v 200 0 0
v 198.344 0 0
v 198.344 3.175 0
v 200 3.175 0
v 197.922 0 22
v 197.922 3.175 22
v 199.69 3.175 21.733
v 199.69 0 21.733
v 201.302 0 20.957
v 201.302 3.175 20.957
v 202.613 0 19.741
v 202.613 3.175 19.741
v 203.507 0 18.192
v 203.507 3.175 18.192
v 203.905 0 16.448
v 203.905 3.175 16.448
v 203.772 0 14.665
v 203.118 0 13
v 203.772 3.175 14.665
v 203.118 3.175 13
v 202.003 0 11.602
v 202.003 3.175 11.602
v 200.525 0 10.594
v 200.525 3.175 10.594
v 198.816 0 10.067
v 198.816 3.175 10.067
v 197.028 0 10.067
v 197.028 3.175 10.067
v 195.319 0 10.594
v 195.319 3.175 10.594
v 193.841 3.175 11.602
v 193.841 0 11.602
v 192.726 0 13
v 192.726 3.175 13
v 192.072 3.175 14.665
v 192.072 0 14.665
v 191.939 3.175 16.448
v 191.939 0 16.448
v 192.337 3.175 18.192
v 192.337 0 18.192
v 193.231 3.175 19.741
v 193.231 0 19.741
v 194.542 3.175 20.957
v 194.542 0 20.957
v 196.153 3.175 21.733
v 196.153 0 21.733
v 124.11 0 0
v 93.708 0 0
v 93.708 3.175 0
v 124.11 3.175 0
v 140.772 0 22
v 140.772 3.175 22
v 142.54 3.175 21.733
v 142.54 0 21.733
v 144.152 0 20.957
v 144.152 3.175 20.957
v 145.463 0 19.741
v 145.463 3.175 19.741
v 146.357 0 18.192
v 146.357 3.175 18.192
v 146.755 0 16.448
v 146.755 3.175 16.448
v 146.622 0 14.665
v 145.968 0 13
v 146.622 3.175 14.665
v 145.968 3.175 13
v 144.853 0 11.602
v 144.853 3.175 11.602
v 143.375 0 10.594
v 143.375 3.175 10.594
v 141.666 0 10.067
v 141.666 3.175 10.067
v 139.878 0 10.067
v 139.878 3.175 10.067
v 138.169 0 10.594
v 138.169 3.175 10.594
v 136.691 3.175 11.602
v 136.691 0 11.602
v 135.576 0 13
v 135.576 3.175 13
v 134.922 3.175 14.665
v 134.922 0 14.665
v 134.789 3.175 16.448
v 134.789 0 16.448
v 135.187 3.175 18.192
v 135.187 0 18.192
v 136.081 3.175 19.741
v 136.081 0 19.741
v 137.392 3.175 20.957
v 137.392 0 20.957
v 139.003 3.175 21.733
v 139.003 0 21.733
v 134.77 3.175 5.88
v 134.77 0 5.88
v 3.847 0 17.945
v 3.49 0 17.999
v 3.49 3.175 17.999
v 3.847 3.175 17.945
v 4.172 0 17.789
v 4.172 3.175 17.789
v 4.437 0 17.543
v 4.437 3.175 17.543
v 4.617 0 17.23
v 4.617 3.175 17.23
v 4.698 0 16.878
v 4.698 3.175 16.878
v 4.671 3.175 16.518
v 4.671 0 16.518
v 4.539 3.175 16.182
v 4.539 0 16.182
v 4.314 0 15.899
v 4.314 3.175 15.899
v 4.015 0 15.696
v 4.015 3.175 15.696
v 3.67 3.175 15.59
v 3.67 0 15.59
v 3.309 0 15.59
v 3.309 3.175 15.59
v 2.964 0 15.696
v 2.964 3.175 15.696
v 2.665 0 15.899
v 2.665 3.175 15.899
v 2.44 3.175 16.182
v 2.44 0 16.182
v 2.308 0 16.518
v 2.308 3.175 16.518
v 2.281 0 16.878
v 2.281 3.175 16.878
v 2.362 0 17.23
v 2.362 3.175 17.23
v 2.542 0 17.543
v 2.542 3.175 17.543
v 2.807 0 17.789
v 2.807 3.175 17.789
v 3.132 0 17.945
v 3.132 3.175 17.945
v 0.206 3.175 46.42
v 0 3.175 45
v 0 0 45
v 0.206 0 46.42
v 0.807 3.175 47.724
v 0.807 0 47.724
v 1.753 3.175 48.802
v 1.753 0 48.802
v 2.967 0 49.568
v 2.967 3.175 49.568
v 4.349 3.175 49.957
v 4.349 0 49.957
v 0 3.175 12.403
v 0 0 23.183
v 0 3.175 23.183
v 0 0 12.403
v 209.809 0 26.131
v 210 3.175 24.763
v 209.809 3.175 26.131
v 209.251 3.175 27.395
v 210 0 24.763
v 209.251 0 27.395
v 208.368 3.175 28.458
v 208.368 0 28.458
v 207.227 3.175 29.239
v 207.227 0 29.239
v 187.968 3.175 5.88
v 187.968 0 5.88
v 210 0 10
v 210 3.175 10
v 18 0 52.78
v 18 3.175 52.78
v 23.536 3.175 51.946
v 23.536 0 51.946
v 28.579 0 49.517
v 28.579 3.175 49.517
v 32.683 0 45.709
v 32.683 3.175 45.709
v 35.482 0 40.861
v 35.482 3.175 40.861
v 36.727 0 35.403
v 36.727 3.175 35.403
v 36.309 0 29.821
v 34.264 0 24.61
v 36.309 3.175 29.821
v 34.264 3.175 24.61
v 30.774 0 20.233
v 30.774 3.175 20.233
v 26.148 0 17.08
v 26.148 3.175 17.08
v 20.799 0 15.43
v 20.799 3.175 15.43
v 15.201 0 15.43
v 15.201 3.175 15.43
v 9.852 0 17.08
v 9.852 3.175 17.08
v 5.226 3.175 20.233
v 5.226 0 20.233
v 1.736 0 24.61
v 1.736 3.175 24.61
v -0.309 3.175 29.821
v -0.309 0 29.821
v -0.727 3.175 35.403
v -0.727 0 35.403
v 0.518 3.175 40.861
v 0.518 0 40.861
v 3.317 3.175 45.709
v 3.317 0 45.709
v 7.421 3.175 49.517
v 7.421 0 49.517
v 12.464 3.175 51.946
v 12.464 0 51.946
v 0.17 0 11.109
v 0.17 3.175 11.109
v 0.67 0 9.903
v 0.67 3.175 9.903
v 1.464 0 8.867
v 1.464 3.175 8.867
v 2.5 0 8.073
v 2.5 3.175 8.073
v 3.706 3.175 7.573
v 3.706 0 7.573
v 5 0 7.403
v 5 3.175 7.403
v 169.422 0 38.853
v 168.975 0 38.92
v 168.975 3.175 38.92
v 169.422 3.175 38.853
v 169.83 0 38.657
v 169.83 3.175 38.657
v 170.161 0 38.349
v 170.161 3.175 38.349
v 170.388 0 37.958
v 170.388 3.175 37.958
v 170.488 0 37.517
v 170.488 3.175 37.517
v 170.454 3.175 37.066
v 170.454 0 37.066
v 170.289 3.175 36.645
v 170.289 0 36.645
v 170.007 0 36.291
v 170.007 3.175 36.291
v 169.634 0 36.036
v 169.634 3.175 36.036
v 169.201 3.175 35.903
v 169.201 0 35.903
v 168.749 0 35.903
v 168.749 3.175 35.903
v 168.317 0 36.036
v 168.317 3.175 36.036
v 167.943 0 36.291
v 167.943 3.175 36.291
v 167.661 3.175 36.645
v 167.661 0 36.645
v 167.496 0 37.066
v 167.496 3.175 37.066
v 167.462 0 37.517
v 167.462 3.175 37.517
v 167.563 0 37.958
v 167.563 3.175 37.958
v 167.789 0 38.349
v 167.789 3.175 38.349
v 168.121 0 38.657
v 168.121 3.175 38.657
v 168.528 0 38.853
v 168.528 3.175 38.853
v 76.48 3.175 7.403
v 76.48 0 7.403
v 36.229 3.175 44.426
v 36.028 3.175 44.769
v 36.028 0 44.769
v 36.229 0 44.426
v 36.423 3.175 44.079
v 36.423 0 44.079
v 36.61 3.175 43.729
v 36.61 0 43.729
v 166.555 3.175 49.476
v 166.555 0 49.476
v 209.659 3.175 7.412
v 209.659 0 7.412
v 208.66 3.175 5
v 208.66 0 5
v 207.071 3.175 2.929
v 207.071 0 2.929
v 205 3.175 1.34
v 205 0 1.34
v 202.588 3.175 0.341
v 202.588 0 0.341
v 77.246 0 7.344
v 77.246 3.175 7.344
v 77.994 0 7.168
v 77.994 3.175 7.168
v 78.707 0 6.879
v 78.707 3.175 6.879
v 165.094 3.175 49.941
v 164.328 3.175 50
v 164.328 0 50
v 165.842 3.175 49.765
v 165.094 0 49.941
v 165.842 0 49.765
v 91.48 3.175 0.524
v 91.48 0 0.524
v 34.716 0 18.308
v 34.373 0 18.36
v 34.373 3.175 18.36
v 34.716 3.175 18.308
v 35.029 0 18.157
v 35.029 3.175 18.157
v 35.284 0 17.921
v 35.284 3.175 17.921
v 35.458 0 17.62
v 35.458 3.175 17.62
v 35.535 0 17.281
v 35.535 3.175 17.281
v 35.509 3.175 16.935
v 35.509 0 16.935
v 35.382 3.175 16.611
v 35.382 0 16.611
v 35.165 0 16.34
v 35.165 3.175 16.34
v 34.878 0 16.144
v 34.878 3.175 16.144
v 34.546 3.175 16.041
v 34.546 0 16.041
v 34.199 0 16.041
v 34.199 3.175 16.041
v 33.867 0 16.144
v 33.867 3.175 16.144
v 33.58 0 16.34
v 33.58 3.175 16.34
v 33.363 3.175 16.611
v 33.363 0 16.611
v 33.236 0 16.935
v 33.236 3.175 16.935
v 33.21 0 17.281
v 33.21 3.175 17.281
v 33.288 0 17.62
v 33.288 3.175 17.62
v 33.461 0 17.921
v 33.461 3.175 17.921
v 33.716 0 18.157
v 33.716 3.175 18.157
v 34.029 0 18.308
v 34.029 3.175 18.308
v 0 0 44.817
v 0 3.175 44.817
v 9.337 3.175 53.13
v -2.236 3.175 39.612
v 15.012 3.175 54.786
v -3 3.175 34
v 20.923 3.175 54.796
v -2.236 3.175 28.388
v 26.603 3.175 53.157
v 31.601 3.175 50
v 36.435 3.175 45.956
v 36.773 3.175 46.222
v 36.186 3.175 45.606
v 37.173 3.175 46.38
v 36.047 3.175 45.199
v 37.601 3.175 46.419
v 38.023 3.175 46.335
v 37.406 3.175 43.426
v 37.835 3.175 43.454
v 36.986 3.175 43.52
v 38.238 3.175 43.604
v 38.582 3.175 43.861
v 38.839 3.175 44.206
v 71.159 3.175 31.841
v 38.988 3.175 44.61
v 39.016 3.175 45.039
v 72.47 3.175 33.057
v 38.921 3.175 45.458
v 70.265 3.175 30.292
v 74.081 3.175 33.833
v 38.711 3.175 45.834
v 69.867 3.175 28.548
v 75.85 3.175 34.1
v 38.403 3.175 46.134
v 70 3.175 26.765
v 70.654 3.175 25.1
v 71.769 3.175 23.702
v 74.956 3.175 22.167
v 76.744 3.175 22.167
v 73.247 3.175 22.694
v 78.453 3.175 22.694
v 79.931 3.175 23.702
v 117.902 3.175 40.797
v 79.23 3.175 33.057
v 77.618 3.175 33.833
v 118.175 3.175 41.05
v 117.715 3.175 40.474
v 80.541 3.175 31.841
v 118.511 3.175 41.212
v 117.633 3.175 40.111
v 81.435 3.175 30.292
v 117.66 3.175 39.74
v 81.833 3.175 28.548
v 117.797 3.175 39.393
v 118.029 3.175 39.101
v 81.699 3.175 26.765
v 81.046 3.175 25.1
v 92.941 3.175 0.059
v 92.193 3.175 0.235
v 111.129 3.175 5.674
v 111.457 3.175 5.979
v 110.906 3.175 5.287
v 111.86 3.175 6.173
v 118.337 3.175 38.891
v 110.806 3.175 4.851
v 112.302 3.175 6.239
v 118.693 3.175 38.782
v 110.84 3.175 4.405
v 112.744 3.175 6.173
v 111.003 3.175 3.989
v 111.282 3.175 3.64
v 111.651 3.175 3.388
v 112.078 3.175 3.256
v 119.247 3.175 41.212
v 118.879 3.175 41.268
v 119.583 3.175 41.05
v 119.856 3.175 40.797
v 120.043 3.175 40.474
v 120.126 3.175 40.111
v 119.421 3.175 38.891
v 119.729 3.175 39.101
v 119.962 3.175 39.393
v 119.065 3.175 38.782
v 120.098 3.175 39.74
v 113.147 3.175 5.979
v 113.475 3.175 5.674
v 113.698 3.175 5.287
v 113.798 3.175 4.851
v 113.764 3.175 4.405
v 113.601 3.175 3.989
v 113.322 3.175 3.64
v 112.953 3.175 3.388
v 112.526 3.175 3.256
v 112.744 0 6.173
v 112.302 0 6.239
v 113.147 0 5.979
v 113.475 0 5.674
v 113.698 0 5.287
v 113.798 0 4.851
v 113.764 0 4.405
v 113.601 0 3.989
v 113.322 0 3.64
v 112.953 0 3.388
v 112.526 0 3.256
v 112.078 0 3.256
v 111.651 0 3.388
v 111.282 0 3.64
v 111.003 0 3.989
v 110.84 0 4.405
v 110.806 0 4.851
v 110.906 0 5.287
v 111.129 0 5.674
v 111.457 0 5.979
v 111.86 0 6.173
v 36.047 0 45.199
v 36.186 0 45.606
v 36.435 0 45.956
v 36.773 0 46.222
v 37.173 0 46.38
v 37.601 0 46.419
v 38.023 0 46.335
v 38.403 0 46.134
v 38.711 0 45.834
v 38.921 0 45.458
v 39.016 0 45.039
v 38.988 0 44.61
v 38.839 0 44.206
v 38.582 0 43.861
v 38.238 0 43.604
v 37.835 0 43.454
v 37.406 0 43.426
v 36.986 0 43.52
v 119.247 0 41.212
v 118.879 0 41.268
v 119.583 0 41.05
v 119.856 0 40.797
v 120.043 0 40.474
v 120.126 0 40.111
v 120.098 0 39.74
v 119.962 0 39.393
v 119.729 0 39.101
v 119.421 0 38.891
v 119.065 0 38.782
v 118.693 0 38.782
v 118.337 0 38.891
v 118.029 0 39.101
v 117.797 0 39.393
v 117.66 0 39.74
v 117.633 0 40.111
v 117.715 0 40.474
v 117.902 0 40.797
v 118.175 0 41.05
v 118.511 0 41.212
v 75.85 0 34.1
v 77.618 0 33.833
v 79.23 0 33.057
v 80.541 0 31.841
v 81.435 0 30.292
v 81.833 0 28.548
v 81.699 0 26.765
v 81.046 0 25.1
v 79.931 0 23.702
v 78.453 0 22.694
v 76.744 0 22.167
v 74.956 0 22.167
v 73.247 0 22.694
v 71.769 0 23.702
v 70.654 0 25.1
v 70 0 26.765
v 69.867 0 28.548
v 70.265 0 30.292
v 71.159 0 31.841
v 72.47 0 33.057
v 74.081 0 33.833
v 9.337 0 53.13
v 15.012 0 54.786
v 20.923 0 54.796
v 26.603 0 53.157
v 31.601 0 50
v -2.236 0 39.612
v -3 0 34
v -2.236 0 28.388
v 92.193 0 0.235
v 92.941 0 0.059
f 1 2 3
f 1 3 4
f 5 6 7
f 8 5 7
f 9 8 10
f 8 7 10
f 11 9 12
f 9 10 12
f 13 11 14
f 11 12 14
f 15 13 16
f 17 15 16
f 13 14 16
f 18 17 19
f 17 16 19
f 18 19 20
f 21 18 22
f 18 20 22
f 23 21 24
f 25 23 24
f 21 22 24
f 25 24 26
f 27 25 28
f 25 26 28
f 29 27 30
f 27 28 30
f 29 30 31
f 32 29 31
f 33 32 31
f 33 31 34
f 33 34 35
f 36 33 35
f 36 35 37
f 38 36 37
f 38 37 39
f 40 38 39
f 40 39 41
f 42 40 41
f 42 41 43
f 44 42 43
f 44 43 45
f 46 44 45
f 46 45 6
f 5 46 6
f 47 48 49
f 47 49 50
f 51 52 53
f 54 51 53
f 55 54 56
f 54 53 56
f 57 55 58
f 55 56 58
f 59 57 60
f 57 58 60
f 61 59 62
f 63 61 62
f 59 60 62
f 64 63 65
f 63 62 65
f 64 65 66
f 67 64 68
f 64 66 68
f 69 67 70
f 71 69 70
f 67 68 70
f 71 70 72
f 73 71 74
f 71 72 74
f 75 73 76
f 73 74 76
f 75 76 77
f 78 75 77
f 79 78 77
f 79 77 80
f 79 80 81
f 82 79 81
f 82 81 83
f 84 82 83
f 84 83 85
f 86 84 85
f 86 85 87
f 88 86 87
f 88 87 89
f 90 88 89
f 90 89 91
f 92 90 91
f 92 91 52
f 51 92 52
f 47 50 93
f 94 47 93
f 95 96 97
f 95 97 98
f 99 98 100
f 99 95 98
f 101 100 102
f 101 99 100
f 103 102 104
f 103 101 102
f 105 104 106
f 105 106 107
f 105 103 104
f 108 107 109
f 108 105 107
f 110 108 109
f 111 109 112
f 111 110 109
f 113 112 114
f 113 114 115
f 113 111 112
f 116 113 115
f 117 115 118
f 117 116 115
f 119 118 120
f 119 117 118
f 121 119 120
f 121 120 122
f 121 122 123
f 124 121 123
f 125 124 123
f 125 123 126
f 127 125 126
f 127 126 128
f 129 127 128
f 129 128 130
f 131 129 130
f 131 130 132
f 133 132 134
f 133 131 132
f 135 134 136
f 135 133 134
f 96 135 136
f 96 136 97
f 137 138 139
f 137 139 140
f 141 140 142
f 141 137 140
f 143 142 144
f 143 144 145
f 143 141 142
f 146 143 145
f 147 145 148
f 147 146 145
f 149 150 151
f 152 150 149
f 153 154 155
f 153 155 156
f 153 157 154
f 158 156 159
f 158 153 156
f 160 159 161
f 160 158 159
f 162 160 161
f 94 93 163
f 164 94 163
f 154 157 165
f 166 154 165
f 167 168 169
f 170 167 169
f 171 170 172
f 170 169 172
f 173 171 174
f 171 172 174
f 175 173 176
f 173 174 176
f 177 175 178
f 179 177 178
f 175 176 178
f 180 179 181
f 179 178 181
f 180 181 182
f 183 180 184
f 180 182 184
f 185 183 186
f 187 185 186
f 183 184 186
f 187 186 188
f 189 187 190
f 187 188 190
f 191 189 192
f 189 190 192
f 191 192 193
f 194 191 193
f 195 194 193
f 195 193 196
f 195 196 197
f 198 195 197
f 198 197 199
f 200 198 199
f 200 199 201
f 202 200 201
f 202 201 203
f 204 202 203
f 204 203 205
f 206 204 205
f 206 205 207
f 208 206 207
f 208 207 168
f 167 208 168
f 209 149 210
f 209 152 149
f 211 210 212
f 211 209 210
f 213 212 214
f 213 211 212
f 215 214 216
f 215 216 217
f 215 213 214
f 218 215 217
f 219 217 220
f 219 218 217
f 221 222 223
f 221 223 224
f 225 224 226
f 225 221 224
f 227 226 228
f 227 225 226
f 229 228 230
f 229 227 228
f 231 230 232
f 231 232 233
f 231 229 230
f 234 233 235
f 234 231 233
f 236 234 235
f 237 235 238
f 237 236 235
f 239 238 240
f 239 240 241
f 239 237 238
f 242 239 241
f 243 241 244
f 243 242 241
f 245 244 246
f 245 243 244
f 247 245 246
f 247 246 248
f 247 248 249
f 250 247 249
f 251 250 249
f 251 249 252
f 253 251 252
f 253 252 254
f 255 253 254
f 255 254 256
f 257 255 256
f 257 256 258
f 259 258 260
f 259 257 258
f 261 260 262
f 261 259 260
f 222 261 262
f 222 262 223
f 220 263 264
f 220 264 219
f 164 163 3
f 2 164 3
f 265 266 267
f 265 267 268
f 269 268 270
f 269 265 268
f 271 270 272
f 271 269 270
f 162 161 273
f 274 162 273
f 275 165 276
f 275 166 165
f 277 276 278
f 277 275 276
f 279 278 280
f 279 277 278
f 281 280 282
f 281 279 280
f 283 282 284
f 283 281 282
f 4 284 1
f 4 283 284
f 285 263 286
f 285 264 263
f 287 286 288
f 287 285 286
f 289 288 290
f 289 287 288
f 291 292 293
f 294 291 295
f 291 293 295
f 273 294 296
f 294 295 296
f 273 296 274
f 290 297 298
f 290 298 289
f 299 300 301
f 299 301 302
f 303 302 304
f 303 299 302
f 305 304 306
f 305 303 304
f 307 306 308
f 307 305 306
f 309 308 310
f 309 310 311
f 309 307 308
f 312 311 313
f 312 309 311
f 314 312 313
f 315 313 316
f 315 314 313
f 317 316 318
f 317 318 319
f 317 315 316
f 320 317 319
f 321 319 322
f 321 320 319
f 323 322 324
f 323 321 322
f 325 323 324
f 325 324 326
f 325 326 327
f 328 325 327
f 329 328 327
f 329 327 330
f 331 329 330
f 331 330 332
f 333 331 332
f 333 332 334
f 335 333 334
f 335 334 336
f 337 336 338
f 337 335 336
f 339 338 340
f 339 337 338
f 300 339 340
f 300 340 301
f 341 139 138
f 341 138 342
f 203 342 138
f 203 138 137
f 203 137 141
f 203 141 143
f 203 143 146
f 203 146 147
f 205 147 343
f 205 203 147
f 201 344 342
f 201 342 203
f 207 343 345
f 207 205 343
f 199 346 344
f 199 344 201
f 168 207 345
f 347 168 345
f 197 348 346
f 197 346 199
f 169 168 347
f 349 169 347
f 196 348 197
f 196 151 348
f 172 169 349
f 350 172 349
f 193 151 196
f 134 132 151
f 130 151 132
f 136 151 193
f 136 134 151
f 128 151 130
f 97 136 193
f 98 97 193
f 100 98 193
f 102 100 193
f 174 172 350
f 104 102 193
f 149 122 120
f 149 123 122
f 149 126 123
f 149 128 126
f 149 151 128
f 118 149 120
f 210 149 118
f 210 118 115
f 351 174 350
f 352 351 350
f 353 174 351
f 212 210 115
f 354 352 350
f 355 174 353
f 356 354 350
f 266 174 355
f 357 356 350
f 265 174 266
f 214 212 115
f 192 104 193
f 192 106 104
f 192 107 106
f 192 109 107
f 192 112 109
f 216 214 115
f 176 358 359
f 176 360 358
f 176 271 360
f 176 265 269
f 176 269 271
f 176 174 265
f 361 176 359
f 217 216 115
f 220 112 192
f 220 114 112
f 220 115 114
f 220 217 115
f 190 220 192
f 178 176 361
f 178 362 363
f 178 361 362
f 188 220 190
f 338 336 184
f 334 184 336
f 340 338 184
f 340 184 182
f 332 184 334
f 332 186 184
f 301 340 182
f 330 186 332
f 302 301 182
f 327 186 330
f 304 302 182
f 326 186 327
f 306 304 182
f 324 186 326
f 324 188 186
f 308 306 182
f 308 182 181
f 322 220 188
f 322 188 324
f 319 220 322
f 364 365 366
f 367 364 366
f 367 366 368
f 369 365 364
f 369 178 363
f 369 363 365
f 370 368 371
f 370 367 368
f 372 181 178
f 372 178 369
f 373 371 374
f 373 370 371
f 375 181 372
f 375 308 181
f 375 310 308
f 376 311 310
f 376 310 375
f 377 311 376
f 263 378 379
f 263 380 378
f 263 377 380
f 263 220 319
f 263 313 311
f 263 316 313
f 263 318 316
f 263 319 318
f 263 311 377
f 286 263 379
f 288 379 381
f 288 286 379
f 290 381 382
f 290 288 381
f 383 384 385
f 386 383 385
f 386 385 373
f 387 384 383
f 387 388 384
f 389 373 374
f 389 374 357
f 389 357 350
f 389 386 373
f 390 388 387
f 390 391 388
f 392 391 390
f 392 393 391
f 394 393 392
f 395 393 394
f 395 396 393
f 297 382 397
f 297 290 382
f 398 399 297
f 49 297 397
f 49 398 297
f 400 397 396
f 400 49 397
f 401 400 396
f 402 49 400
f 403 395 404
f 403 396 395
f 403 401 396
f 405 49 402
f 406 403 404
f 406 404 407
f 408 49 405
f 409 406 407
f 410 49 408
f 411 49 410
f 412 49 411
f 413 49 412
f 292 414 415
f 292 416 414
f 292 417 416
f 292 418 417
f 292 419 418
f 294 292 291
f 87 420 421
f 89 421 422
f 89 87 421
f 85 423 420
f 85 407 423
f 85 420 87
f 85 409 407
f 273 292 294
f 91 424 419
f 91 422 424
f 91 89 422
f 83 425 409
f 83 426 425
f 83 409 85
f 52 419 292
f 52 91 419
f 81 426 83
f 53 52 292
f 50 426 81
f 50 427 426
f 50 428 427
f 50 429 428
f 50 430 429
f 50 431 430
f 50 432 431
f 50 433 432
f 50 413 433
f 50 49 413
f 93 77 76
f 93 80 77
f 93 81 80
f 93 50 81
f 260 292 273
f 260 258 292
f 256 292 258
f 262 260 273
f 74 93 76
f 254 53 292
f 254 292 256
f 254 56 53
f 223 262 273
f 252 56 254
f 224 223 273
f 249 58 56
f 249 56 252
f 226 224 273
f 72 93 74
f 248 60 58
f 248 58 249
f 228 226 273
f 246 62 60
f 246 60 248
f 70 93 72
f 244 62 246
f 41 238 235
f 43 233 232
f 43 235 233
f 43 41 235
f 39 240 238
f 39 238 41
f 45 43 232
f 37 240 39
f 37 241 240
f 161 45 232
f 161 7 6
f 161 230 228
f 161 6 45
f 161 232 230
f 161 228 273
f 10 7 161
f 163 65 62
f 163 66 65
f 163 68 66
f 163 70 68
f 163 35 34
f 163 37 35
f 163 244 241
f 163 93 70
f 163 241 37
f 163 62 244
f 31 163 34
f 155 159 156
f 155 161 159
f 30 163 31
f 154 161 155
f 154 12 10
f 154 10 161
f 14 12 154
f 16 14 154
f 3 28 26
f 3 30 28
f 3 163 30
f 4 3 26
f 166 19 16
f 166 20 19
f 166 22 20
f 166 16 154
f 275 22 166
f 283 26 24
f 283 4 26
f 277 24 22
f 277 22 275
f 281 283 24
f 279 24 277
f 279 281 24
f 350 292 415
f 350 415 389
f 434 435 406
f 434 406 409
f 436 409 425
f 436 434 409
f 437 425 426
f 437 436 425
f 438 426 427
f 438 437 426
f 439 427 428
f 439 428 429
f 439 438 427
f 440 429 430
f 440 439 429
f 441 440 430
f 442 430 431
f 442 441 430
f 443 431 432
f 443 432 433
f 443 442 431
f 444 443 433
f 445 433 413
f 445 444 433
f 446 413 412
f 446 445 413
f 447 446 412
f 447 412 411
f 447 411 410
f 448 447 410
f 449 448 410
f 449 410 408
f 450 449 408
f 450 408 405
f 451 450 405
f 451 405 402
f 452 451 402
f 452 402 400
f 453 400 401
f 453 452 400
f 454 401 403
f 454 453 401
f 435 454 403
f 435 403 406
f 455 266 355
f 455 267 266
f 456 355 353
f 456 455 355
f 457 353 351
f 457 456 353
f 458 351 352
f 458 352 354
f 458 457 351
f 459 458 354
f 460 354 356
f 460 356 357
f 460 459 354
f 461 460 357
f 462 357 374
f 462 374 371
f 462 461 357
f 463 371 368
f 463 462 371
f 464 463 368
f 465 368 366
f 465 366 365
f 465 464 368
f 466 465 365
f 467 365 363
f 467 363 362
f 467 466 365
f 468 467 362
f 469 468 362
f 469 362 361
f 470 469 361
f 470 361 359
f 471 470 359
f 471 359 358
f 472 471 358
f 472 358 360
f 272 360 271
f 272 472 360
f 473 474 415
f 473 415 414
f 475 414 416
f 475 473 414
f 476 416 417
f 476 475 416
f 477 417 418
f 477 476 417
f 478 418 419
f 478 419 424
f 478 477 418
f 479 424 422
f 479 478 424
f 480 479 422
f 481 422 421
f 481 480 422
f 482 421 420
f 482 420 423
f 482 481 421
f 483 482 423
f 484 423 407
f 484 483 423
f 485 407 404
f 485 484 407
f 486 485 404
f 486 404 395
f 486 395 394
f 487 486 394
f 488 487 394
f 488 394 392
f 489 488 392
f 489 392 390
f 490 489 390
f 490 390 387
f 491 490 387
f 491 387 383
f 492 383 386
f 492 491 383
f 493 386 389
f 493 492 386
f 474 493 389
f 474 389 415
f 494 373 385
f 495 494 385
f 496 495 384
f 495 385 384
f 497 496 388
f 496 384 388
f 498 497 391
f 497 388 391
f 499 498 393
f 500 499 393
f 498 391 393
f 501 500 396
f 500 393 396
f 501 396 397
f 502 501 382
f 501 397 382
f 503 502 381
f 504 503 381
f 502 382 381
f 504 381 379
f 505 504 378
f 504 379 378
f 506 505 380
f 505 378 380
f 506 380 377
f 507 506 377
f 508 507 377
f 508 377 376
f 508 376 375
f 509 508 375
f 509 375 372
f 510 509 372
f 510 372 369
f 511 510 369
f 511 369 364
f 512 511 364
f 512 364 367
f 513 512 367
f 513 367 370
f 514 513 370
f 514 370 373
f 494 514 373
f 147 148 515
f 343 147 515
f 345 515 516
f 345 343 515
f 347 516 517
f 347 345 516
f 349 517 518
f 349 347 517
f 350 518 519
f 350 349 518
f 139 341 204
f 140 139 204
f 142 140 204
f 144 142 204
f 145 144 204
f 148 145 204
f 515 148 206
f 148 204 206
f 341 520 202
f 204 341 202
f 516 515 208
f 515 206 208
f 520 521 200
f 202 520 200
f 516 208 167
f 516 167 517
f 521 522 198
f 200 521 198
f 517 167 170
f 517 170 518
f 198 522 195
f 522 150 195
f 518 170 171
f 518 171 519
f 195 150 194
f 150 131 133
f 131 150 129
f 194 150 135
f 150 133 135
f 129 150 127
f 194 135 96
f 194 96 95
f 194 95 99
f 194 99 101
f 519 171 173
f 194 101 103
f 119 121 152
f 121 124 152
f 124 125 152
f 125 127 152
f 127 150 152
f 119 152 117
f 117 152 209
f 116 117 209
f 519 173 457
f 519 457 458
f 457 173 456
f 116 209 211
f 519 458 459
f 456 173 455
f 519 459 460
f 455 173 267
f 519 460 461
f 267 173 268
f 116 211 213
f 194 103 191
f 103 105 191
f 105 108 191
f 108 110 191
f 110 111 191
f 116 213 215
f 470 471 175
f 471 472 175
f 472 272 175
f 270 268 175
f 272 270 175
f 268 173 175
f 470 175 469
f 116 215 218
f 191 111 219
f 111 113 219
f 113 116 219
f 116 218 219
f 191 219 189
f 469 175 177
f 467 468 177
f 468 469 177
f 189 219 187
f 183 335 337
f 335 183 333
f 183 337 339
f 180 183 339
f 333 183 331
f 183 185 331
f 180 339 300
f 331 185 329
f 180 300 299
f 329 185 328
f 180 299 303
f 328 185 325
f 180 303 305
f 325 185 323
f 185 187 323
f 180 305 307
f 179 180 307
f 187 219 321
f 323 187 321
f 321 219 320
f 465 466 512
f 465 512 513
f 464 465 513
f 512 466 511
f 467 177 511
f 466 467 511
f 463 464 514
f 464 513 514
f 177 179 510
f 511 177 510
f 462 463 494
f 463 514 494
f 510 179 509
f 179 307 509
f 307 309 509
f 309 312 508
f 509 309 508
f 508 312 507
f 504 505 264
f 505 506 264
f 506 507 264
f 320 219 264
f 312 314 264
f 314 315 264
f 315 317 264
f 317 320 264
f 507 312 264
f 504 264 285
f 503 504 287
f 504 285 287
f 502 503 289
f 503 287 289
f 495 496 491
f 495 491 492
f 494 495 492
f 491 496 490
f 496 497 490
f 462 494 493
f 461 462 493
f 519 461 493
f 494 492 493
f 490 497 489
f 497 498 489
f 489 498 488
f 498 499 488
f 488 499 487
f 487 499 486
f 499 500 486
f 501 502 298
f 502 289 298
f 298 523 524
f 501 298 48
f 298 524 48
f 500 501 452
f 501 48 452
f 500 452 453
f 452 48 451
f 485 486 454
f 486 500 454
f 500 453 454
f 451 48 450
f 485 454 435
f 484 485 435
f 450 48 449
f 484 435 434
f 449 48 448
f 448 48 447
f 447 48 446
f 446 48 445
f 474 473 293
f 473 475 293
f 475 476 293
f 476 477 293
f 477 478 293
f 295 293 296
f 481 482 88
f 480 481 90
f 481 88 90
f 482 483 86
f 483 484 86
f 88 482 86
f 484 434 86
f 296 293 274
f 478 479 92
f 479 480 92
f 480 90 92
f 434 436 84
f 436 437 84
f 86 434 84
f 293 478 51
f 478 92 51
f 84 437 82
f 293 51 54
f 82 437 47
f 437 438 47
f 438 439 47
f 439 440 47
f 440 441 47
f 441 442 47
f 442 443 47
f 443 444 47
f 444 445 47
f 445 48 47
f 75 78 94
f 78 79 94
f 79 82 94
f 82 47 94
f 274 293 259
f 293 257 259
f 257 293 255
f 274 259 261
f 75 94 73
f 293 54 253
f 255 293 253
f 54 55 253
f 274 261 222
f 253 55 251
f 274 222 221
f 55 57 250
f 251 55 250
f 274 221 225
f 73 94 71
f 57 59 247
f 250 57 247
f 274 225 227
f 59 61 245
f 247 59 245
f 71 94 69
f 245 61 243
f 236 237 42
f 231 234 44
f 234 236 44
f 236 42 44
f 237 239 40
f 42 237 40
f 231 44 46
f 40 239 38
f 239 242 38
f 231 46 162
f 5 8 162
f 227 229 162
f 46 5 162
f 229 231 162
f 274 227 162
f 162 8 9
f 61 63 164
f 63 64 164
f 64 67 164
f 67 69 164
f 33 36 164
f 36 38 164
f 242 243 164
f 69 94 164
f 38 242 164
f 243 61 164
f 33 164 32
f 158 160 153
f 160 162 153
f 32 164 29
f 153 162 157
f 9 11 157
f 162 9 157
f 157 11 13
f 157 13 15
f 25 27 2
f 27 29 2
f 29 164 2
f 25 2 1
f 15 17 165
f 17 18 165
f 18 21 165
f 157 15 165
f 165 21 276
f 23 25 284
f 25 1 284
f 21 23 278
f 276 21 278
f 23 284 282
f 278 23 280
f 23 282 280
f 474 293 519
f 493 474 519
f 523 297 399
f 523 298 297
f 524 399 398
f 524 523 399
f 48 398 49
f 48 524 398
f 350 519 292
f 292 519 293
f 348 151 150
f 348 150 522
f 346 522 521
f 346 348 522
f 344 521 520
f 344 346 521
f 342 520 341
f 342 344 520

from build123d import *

# Parameters (mm, degrees)
SKETCH1_W           = 210
SKETCH1_H           = 50
SKETCH1_R           = 1.211665018
SKETCH1_R_2         = 1.165617118
SKETCH1_R_3         = 1.5
SKETCH1_R_4         = 1.25
SKETCH1_R_5         = 1.517273905
BOSS_EXTRUDE1_DEPTH = 3.175
SKETCH2_R           = 2
CUT_EXTRUDE1_DEPTH  = 10
SKETCH3_R           = 6
SKETCH3_R_2         = 0.586995366
CUT_EXTRUDE2_DEPTH  = 57.15
CUT_EXTRUDE7_DEPTH  = 10
FILLET3_R           = 5
SKETCH11_R          = 21
SKETCH11_R_2        = 2
BOSS_EXTRUDE4_DEPTH = 3.175
SKETCH12_R          = 18.78
CUT_EXTRUDE8_DEPTH  = 10
FILLET4_R           = 10


with BuildPart() as part:
    # Sketch1 → Boss-Extrude1 (new body)
    with BuildSketch(Plane(origin=(0, 0, 0), x_dir=(1, 0, 0), z_dir=(0, 1, 0))):
        with Locations((105, -25)):
            Rectangle(SKETCH1_W, SKETCH1_H)
        with Locations(Location((3.489526233, -16.787661112, 0), (0, 0, 270))):
            Circle(SKETCH1_R, mode=Mode.SUBTRACT)
        with Locations(Location((34.37258772, -17.194005245, 0), (0, 0, 270))):
            Circle(SKETCH1_R_2, mode=Mode.SUBTRACT)
        with Locations(Location((37.520749958, -44.921198121, 0), (0, 0, 270))):
            Circle(SKETCH1_R_3, mode=Mode.SUBTRACT)
        with Locations(Location((118.879039361, -40.017685043, 0), (0, 0, 270))):
            Circle(SKETCH1_R_4, mode=Mode.SUBTRACT)
        with Locations(Location((112.302052499, -4.739260115, 0), (0, 0, 270))):
            Circle(SKETCH1_R_3, mode=Mode.SUBTRACT)
        with Locations(Location((168.975233936, -37.403209633, 0), (0, 0, 270))):
            Circle(SKETCH1_R_5, mode=Mode.SUBTRACT)
    extrude(amount=BOSS_EXTRUDE1_DEPTH)

    # Sketch2 → Cut-Extrude1 (cut)
    with BuildSketch(Plane(origin=(0, 3.175, 0), x_dir=(1, 0, 0), z_dir=(0, 1, 0))):
        with Locations(Location((10, -26, 0), (0, 0, 270))):
            Circle(SKETCH2_R)
        with Locations(Location((10, -42, 0), (0, 0, 270))):
            Circle(SKETCH2_R)
        with Locations(Location((26, -26, 0), (0, 0, 270))):
            Circle(SKETCH2_R)
        with Locations(Location((26, -42, 0), (0, 0, 270))):
            Circle(SKETCH2_R)
    extrude(amount=-CUT_EXTRUDE1_DEPTH, mode=Mode.SUBTRACT)

    # Sketch3 → Cut-Extrude2 (cut)
    with BuildSketch(Plane(origin=(0, 3.175, 0), x_dir=(1, 0, 0), z_dir=(0, 1, 0))):
        with Locations(Location((75.84991357, -28.1, 0), (0, 0, 270))):
            Circle(SKETCH3_R)
        with Locations(Location((140.771956051, -16, 0), (0, 0, 270))):
            Circle(SKETCH3_R)
        with Locations(Location((18, -34, 0), (0, 0, 270))):
            Circle(SKETCH3_R_2)
        with Locations(Location((197.921956051, -16, 0), (0, 0, 270))):
            Circle(SKETCH3_R)
    extrude(amount=-CUT_EXTRUDE2_DEPTH, mode=Mode.SUBTRACT)

    # Sketch10 → Cut-Extrude7 (cut)
    with BuildSketch(Plane(origin=(0, 3.175, 0), x_dir=(1, 0, 0), z_dir=(0, 1, 0))):
        Polygon((210, -27.859435908), (165.502877994, -50), (210, -50), align=None)
        Polygon((92.532613397, 0), (77.65477062, -7.402812063), (0, -7.402812063), (0, 0), align=None)
        Polygon((124.109963401, 0), (134.770313295, -5.880313872), (187.967697751, -5.880313872), (198.343585303, 0), align=None)
    extrude(amount=-CUT_EXTRUDE7_DEPTH, mode=Mode.SUBTRACT)

    # Fillet3
    fillet3_edges = [part.edges().sort_by_distance(p)[0] for p in [
        (0, 1.5875, 7.402812063),
        (0, 1.5875, 50),
        (92.532613397, 1.5875, 0),
        (210, 1.5875, 27.859435908),
        (165.502877994, 1.5875, 50),
        (77.65477062, 1.5875, 7.402812063),
    ]]
    fillet(fillet3_edges, radius=FILLET3_R)

    # Sketch11 → Boss-Extrude4 (add)
    with BuildSketch(Plane(origin=(0, 3.175, 0), x_dir=(1, 0, 0), z_dir=(0, 1, 0))):
        with Locations((18, -34)):
            Circle(SKETCH11_R)
        with Locations(Location((10, -26, 0), (0, 0, 270))):
            Circle(SKETCH11_R_2, mode=Mode.SUBTRACT)
        with Locations(Location((10, -42, 0), (0, 0, 270))):
            Circle(SKETCH11_R_2, mode=Mode.SUBTRACT)
        with Locations(Location((26, -26, 0), (0, 0, 270))):
            Circle(SKETCH11_R_2, mode=Mode.SUBTRACT)
        with Locations(Location((26, -42, 0), (0, 0, 270))):
            Circle(SKETCH11_R_2, mode=Mode.SUBTRACT)
    extrude(amount=-BOSS_EXTRUDE4_DEPTH)

    # Sketch12 → Cut-Extrude8 (cut)
    with BuildSketch(Plane(origin=(0, 3.175, 0), x_dir=(1, 0, 0), z_dir=(0, 1, 0))):
        with Locations(Location((18, -34, 0), (0, 0, 270))):
            Circle(SKETCH12_R)
    extrude(amount=-CUT_EXTRUDE8_DEPTH, mode=Mode.SUBTRACT)

    # Fillet4
    fillet4_edges = [part.edges().sort_by_distance(p)[0] for p in [
        (210, 1.5875, 0),
    ]]
    fillet(fillet4_edges, radius=FILLET4_R)


solid = part.part
